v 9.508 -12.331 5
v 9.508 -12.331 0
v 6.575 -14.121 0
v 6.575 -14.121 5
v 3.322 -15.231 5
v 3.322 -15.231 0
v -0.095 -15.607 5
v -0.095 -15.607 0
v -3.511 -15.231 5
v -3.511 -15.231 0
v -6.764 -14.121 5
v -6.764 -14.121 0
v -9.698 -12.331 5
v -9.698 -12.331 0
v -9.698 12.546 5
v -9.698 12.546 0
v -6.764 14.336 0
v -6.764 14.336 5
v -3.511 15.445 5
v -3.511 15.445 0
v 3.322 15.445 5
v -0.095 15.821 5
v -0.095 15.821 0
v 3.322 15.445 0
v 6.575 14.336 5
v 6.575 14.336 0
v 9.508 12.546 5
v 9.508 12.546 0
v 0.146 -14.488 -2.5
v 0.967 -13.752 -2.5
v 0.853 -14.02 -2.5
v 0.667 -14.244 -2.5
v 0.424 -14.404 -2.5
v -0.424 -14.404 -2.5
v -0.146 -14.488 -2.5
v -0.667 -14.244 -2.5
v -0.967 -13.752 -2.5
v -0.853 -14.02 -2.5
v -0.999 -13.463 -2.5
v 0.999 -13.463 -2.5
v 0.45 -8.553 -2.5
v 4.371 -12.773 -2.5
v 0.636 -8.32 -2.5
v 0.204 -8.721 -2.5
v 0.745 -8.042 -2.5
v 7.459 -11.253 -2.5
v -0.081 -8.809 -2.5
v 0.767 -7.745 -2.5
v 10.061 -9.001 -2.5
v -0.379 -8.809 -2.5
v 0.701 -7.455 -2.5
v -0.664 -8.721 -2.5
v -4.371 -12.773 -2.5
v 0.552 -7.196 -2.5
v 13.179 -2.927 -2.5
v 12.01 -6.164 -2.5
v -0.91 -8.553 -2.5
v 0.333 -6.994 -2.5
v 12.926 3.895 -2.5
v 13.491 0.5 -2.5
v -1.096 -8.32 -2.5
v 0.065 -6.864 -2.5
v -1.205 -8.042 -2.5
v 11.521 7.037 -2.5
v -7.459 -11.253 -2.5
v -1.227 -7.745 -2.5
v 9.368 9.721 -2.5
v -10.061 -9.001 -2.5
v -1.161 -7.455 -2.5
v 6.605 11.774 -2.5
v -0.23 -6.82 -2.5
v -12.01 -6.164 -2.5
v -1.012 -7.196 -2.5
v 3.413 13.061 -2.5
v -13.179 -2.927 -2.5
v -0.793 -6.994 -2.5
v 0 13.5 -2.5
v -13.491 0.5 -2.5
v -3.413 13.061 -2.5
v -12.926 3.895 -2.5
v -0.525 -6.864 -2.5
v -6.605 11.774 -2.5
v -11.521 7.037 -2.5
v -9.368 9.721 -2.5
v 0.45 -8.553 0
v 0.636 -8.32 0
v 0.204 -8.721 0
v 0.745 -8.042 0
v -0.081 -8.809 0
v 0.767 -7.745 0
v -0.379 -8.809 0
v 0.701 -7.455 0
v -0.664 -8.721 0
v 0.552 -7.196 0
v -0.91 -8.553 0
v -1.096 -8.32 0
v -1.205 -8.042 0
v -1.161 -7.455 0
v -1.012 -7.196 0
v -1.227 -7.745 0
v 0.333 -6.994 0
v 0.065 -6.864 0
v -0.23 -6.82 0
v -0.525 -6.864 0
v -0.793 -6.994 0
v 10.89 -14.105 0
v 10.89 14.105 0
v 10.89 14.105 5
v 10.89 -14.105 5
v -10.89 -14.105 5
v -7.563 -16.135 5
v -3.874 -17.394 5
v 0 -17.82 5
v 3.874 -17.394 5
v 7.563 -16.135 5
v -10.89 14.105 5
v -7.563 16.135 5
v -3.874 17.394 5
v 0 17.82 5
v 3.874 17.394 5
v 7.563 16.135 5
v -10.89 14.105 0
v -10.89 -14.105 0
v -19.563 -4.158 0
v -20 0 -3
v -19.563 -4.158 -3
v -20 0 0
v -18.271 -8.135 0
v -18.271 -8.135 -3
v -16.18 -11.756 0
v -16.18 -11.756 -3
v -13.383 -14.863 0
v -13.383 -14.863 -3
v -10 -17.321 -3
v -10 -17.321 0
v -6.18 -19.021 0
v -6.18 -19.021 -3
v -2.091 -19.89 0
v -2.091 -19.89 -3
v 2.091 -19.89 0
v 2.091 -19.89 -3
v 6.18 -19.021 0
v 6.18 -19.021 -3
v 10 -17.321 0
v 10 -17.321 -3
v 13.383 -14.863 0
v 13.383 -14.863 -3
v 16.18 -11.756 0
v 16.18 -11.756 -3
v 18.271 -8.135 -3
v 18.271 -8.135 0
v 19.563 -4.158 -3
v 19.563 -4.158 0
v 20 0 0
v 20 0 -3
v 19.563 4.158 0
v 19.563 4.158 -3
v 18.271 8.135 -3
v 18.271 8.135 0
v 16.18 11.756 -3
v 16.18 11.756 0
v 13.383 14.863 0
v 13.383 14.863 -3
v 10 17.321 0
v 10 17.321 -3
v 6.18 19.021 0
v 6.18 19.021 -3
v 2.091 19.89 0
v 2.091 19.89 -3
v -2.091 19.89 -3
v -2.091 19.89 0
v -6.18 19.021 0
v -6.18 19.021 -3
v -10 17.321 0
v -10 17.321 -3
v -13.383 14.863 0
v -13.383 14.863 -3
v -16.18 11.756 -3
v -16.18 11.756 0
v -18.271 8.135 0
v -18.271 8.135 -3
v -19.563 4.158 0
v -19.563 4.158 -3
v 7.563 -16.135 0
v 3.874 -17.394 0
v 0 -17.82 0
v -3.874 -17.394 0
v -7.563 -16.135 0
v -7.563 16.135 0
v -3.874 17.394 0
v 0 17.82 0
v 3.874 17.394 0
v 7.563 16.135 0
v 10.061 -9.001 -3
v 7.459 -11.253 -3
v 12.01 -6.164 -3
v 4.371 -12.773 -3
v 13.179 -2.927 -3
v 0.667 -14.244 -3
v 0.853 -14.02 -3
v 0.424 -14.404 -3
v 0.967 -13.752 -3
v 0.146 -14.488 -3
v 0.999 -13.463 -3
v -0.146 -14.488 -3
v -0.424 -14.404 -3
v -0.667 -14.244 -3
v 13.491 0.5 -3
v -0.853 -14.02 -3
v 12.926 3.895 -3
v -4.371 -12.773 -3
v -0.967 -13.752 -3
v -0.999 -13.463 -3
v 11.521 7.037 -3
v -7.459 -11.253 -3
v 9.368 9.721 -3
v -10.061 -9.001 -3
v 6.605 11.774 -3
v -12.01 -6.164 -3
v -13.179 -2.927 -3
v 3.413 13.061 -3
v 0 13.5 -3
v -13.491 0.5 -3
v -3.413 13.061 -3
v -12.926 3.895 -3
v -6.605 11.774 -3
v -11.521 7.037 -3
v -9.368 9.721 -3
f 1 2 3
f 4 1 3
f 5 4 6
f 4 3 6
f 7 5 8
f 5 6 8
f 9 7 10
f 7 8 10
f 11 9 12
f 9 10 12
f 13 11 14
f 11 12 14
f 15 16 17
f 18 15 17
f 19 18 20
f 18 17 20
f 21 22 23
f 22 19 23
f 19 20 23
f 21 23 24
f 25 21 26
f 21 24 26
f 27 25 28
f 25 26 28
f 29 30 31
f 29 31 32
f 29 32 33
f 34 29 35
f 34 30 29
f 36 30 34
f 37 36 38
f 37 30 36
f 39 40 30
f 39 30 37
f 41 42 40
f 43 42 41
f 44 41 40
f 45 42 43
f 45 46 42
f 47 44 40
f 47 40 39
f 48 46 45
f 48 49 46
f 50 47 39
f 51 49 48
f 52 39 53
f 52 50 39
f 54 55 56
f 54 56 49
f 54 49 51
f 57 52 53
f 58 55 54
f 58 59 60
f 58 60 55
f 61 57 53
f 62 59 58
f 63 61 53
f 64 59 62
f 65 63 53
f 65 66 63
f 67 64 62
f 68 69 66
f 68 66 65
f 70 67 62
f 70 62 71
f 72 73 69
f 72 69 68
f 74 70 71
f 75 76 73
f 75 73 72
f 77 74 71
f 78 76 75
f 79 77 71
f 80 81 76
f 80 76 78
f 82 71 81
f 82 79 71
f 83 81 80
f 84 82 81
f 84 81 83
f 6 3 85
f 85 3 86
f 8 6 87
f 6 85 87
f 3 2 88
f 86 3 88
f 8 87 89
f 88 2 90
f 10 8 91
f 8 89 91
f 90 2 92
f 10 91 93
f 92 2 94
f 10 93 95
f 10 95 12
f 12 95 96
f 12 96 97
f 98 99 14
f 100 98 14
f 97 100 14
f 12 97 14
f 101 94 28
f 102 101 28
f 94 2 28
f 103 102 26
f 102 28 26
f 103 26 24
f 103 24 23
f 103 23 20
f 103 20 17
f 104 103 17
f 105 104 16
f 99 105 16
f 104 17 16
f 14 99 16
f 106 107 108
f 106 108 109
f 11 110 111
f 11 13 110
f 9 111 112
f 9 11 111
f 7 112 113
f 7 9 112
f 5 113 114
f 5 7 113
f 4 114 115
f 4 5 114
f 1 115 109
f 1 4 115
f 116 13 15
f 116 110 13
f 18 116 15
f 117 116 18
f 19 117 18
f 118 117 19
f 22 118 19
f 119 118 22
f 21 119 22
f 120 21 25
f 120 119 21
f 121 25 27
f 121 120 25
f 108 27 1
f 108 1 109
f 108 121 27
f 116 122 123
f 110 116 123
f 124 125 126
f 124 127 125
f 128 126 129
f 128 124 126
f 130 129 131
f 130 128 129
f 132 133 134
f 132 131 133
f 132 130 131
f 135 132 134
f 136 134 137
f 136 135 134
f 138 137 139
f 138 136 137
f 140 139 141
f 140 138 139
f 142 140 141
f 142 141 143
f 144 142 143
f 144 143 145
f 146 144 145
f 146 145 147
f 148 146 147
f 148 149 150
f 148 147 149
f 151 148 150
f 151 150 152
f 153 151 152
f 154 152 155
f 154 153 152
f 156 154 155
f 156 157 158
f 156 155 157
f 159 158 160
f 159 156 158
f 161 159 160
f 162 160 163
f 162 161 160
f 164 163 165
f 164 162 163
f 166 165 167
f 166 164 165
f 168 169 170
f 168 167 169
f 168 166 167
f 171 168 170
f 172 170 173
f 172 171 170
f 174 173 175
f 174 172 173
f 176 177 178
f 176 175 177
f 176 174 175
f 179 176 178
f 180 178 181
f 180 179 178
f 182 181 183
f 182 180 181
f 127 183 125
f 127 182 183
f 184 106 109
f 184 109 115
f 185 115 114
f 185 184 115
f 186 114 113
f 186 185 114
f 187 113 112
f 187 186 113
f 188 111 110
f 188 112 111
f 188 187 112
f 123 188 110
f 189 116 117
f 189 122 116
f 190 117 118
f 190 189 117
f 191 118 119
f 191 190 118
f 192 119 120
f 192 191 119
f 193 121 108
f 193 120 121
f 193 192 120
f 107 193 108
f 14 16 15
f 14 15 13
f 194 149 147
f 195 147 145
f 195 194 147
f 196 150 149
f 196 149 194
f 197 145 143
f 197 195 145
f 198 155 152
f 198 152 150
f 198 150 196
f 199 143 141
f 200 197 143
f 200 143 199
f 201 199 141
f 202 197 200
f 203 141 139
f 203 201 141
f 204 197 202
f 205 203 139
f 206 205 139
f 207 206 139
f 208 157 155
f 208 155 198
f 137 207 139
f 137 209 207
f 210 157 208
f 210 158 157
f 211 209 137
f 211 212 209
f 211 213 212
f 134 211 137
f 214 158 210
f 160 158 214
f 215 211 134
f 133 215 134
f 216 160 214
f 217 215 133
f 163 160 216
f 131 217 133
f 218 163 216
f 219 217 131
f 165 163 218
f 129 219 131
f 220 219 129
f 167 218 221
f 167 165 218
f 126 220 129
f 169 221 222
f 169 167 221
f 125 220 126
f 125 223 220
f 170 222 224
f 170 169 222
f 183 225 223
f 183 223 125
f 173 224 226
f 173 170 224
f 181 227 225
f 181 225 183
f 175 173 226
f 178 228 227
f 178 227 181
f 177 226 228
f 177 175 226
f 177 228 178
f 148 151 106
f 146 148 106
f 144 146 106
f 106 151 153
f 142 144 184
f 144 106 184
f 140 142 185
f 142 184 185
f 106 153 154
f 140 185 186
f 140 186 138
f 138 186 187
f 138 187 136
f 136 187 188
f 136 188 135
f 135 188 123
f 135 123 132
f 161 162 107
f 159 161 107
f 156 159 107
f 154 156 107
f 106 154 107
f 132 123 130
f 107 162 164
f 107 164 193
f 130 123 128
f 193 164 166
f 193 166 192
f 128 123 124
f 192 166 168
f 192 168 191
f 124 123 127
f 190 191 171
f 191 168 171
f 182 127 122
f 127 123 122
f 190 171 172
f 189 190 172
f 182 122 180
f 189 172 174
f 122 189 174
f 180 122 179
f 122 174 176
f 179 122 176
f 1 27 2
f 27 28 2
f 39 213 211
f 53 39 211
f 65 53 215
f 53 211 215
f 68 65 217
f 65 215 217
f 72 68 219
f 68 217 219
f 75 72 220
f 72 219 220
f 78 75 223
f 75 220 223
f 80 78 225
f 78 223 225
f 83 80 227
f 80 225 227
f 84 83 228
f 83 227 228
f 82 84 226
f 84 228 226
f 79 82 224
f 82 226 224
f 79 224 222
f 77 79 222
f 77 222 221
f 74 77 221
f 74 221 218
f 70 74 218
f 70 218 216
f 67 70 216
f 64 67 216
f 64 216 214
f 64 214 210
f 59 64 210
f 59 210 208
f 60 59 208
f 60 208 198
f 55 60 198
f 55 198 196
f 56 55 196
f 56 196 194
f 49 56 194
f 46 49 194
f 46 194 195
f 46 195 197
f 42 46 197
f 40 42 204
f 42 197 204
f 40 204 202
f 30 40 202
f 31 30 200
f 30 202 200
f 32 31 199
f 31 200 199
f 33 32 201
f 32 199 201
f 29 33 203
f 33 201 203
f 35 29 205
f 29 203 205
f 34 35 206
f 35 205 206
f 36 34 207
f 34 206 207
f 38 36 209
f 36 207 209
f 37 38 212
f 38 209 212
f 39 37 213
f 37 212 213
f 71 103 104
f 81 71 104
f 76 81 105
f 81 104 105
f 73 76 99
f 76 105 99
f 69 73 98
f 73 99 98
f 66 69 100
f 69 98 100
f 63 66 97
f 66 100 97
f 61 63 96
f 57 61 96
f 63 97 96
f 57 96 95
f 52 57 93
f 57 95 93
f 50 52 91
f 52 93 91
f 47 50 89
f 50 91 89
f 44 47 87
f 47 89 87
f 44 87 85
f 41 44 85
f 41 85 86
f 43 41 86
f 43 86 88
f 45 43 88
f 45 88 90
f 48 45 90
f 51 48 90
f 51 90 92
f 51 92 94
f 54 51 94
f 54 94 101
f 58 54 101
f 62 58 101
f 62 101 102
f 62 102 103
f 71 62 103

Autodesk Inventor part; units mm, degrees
ref_plane "YZ Plane" through (0, 0, 0) normal (1, 0, 0) x (0, 1, 0)
ref_plane "XZ Plane" through (0, 0, 0) normal (0, 1, 0) x (-1, 0, 0)
ref_plane "XY Plane" through (0, 0, 0) normal (0, 0, 1) x (1, 0, 0)
sketch "Boceto1" plane through (0, 0, 0) normal (0, 0, 1) x (1, 0, 0)
  line L0 (13, 15.1987) -> (13, -15.1987)
  arc A0 (13, 15.1987) -> (-13, 15.1987) centre (0, 0) ccw
  line L1 (-10.89, 14.1053) -> (-10.89, -14.1053)
  arc A1 (10.89, 14.1053) -> (-10.89, 14.1053) centre (0, 0) ccw
  line L2 (-13, -15.1987) -> (-13, 15.1987)
  arc A2 (-10.89, -14.1053) -> (10.89, -14.1053) centre (0, 0) ccw
  arc A3 (-13, -15.1987) -> (13, -15.1987) centre (0, 0) ccw
  line L3 (10.89, 14.1053) -> (10.89, -14.1053)
  line L4 (-9.6976, 12.5455) -> (-9.6976, -12.3312)
  arc A4 (9.5084, 12.5455) -> (-9.6976, 12.5455) centre (-0.0946, 0.1071) ccw
  arc A5 (-9.6976, -12.3312) -> (9.5084, -12.3312) centre (-0.0946, 0.1071) ccw
  line L5 (9.5084, 12.5455) -> (9.5084, -12.3312)
extrude "Extrusión1" add sketch "Boceto1" along normal blind 5 contours A1 L3 A2 L1
sketch "Boceto2" plane through (0, 0, 0) normal (0, 0, -1) x (-1, 0, 0)
  arc A0 (-9.5084, -12.3312) -> (9.6976, -12.3312) centre (0.0946, 0.1071) ccw projected
  arc A1 (-10.89, -14.1053) -> (10.89, -14.1053) centre (0, 0) ccw projected
  arc A2 (13.13, 15.0742) -> (-12.87, 15.0742) centre (0.13, -0.1245) ccw
  arc A3 (-12.87, -15.0742) -> (12.87, -15.0742) centre (0, 0.2347) ccw
  circle A4 centre (0, 0) radius 20
  line L0 (-12.87, -15.0742) -> (-12.87, -12.3254)
  line L1 (-12.87, 12.3254) -> (-12.87, 15.0742)
  line L2 (12.87, 12.3254) -> (13, 9.0726)
  line L3 (12.87, -12.3254) -> (12.87, -15.0742)
  dimension "d2" = 40
extrude "Extrusión2" add sketch "Boceto2" along normal blind 3
sketch "Boceto3" plane through (0, 0, -3) normal (0, 0, -1) x (-1, 0, 0)
  arc A0 (0.9994, -13.463) -> (-0.9994, -13.463) centre (0, 0) ccw
  arc A1 (-0.9994, -13.463) -> (0.9994, -13.463) centre (0, -13.4987) ccw
  dimension "d5" = 27
  dimension "d6" = 2
extrude "Extrusión3" cut sketch "Boceto3" against normal blind 0.5
hole "Hole1" at (-0.23, -7.8199, -2.5) direction (0, 0, 1) diameter 2 end through all
equation "\"d16\" = Grosor"
equation "\"Radio_pliegue\" = Grosor"
equation "\"Anchura_desahogo_plegado\" = Grosor"
equation "\"Profundidad_desahogo_plegado\" = 0.5 * Grosor"
equation "\"Tamaño_destalonado\" = 4 * Grosor"
equation "\"Remanente_mínimo\" = 2 * Grosor"
equation "\"Radiodetransición\" = Radio_pliegue"
equation "\"Tamaño_de_radio_de_Jacobi\" = Radio_pliegue"
equation "\"TamañoSeparación\" = Grosor"
equation "\"Grosor\" = 0.5"
properties part number "Tapa 3"
